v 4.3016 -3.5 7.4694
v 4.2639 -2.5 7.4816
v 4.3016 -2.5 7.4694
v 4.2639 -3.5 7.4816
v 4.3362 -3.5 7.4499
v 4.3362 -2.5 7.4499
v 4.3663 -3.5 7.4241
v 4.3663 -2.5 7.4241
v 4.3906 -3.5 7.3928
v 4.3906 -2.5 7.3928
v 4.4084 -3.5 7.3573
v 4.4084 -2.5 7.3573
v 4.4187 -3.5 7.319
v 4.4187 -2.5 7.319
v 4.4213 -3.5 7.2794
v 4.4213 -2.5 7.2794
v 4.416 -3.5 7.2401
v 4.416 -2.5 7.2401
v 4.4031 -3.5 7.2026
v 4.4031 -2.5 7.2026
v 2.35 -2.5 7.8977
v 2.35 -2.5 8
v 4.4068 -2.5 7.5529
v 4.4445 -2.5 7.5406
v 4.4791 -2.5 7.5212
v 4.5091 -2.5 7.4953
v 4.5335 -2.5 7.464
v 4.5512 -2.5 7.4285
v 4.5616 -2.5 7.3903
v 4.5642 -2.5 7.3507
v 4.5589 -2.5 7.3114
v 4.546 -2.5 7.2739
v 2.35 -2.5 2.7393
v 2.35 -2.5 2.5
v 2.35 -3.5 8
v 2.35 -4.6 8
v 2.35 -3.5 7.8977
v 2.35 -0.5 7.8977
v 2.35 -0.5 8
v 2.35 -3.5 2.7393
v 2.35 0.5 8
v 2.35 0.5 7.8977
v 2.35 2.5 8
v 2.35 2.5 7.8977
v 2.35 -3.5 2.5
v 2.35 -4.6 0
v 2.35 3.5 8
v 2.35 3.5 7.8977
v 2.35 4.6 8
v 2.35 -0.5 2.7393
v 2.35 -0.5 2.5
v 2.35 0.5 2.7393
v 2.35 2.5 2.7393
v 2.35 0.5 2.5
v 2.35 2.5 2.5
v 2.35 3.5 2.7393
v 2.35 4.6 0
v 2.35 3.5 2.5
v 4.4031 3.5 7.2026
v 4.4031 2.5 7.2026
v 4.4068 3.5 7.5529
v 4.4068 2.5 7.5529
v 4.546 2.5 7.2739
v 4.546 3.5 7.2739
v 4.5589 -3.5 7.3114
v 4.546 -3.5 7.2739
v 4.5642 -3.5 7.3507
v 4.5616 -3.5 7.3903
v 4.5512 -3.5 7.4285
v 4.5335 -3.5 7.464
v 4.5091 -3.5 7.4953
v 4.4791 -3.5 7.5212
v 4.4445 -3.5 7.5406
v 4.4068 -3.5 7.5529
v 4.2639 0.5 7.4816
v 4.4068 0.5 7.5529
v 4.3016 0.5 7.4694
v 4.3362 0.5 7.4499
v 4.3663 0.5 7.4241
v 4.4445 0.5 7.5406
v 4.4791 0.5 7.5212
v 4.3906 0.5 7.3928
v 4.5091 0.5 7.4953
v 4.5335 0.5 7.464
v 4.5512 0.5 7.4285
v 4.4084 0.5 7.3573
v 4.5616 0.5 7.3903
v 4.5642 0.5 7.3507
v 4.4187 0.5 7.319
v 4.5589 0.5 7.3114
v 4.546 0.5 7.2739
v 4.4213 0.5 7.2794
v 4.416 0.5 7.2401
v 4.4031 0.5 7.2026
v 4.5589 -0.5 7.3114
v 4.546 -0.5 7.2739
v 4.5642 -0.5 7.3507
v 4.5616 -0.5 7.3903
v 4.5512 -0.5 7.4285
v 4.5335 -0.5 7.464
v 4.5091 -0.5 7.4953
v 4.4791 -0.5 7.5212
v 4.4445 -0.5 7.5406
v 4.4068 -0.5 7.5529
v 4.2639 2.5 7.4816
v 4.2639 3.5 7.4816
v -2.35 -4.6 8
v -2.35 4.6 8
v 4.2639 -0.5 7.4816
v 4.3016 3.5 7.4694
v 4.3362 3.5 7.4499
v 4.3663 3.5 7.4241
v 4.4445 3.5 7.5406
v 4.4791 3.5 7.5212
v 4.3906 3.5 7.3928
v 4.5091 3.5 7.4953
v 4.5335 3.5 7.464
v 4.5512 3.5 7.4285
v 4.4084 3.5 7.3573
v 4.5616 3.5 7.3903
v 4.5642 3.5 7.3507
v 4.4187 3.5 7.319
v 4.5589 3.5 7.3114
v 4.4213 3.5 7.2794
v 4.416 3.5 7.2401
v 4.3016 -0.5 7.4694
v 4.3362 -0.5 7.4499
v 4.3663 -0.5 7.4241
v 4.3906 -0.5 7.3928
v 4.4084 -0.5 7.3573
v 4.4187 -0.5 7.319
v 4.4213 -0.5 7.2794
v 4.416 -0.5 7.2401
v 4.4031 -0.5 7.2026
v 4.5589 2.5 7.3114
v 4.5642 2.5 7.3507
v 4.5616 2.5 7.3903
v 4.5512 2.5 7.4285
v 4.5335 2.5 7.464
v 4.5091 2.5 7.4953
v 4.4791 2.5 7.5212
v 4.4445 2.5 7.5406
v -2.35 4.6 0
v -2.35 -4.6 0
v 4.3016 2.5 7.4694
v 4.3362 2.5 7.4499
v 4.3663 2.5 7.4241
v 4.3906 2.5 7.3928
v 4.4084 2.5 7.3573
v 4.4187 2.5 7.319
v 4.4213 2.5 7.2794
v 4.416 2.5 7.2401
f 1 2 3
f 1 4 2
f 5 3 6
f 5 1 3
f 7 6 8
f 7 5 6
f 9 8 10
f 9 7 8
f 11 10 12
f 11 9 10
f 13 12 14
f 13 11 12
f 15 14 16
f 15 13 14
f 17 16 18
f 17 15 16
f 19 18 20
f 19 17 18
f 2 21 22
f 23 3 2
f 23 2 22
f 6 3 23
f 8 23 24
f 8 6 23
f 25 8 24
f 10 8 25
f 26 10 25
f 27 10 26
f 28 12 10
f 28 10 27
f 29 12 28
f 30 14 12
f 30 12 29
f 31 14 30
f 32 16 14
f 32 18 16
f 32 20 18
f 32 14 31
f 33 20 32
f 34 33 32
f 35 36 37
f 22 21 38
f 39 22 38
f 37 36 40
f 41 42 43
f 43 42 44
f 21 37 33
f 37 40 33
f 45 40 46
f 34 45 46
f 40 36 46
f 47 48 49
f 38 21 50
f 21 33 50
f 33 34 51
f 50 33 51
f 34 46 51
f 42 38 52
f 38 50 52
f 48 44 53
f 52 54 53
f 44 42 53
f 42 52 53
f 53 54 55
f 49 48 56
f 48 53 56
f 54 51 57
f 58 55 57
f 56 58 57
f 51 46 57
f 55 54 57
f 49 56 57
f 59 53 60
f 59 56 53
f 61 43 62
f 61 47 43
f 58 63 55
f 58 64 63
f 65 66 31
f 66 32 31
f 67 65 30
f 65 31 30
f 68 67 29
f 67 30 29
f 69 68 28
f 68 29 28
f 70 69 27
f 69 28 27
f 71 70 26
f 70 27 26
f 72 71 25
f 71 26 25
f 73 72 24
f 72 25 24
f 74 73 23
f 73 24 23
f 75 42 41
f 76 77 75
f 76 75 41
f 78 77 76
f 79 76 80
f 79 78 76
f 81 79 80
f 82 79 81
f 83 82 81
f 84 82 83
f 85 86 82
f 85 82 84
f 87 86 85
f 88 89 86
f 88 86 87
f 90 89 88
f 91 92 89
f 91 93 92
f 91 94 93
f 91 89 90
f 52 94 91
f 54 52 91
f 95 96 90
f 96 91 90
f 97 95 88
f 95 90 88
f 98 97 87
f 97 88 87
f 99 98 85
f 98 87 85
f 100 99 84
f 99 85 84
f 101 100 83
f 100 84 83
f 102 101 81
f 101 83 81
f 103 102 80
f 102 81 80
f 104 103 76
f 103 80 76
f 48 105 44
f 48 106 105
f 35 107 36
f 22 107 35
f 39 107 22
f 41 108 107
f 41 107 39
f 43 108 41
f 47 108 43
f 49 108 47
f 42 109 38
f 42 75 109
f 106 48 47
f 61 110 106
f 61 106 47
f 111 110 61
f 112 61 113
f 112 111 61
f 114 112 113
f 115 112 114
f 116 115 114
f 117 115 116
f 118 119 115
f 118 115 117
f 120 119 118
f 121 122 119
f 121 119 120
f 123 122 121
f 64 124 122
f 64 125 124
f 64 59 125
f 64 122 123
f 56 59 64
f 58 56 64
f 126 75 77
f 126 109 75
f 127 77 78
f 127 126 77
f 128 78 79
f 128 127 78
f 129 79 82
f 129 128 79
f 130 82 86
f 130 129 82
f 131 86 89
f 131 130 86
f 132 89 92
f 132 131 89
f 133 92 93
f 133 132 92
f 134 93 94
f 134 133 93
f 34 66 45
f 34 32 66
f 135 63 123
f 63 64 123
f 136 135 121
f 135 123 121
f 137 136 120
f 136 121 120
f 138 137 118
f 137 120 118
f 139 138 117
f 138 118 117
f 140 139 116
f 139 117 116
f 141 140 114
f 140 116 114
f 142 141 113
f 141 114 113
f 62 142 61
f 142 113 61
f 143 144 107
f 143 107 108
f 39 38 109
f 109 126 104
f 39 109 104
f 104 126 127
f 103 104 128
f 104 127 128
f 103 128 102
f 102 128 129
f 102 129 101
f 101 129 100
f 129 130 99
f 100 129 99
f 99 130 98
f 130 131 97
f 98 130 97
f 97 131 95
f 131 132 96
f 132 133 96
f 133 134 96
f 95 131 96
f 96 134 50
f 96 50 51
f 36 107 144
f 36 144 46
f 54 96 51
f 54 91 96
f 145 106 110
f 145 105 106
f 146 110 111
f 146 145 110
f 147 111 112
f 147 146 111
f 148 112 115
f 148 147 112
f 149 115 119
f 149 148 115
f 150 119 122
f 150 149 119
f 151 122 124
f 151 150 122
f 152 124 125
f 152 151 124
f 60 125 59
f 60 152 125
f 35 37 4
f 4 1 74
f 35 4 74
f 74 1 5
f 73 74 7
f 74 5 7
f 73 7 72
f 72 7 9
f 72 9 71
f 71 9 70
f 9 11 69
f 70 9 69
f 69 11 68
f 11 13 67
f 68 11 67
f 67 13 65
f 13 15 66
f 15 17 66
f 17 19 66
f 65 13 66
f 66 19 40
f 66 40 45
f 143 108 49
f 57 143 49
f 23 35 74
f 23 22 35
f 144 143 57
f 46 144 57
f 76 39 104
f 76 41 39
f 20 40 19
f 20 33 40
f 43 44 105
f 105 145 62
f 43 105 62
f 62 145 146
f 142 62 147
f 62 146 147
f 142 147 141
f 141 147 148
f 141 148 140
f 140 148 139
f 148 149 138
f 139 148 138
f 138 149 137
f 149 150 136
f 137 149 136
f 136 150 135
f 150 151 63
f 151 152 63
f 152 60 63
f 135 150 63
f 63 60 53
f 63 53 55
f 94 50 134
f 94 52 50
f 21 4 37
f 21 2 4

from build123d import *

# Parameters (mm, degrees)
SKETCH1_W                  = 4.7
SKETCH1_H                  = 9.2
BOSS_EXTRUDE1_DEPTH        = 8
BOSS_EXTRUDE2_DEPTH        = 0.5
FILLET1_R                  = 0.2
FILLET2_R                  = 0.2
LPATTERN2_COUNT            = 2
LPATTERN2_PITCH            = 3
FILLET1_OF_LPATTERN2_R     = 0.2
FILLET2_OF_LPATTERN2_R     = 0.2
LPATTERN2_COL_COUNT        = 2
LPATTERN2_COL_PITCH        = 3
FILLET1_OF_LPATTERN2_COL_R = 0.2
FILLET2_OF_LPATTERN2_COL_R = 0.2


with BuildPart() as part:
    # Sketch1 → Boss-Extrude1 (new body)
    with BuildSketch(Plane.XY):
        Rectangle(SKETCH1_W, SKETCH1_H)
    extrude(amount=BOSS_EXTRUDE1_DEPTH)

    # Sketch2 → Boss-Extrude2 (add, symmetric)
    with BuildSketch(Plane(origin=(0, 0, 0), x_dir=(1, 0, 0), z_dir=(0, 1, 0))):
        Polygon((2.35, -8), (4.65, -7.5), (2.35, -2.5), (2.35, -2.739288485), (4.507138989, -7.428721069), (2.35, -7.897664328), align=None)
    boss_extrude2 = extrude(amount=BOSS_EXTRUDE2_DEPTH, both=True)

    # Fillet1
    fillet1_edges = [part.edges().sort_by_distance(p)[0] for p in [
        (4.507138989, 0, 7.428721069),
    ]]
    fillet(fillet1_edges, radius=FILLET1_R)

    # Fillet2
    fillet2_edges = [part.edges().sort_by_distance(p)[0] for p in [
        (4.65, 0, 7.5),
    ]]
    fillet(fillet2_edges, radius=FILLET2_R)

    # LPattern2: Boss-Extrude2 ×2
    with Locations(*[(0, -i * LPATTERN2_PITCH, 0) for i in range(1, LPATTERN2_COUNT)]):
        add(boss_extrude2)

    # Fillet1 of LPattern2
    fillet1_of_lpattern2_edges = [part.edges().sort_by_distance(p)[0] for p in [
        (4.507138989, -3, 7.428721069),
    ]]
    fillet(fillet1_of_lpattern2_edges, radius=FILLET1_OF_LPATTERN2_R)

    # Fillet2 of LPattern2
    fillet2_of_lpattern2_edges = [part.edges().sort_by_distance(p)[0] for p in [
        (4.65, -3, 7.5),
    ]]
    fillet(fillet2_of_lpattern2_edges, radius=FILLET2_OF_LPATTERN2_R)

    # LPattern2 col: Boss-Extrude2 ×2
    with Locations(*[(0, i * LPATTERN2_COL_PITCH, 0) for i in range(1, LPATTERN2_COL_COUNT)]):
        add(boss_extrude2)

    # Fillet1 of LPattern2 col
    fillet1_of_lpattern2_col_edges = [part.edges().sort_by_distance(p)[0] for p in [
        (4.507138989, 3, 7.428721069),
    ]]
    fillet(fillet1_of_lpattern2_col_edges, radius=FILLET1_OF_LPATTERN2_COL_R)

    # Fillet2 of LPattern2 col
    fillet2_of_lpattern2_col_edges = [part.edges().sort_by_distance(p)[0] for p in [
        (4.65, 3, 7.5),
    ]]
    fillet(fillet2_of_lpattern2_col_edges, radius=FILLET2_OF_LPATTERN2_COL_R)


solid = part.part
